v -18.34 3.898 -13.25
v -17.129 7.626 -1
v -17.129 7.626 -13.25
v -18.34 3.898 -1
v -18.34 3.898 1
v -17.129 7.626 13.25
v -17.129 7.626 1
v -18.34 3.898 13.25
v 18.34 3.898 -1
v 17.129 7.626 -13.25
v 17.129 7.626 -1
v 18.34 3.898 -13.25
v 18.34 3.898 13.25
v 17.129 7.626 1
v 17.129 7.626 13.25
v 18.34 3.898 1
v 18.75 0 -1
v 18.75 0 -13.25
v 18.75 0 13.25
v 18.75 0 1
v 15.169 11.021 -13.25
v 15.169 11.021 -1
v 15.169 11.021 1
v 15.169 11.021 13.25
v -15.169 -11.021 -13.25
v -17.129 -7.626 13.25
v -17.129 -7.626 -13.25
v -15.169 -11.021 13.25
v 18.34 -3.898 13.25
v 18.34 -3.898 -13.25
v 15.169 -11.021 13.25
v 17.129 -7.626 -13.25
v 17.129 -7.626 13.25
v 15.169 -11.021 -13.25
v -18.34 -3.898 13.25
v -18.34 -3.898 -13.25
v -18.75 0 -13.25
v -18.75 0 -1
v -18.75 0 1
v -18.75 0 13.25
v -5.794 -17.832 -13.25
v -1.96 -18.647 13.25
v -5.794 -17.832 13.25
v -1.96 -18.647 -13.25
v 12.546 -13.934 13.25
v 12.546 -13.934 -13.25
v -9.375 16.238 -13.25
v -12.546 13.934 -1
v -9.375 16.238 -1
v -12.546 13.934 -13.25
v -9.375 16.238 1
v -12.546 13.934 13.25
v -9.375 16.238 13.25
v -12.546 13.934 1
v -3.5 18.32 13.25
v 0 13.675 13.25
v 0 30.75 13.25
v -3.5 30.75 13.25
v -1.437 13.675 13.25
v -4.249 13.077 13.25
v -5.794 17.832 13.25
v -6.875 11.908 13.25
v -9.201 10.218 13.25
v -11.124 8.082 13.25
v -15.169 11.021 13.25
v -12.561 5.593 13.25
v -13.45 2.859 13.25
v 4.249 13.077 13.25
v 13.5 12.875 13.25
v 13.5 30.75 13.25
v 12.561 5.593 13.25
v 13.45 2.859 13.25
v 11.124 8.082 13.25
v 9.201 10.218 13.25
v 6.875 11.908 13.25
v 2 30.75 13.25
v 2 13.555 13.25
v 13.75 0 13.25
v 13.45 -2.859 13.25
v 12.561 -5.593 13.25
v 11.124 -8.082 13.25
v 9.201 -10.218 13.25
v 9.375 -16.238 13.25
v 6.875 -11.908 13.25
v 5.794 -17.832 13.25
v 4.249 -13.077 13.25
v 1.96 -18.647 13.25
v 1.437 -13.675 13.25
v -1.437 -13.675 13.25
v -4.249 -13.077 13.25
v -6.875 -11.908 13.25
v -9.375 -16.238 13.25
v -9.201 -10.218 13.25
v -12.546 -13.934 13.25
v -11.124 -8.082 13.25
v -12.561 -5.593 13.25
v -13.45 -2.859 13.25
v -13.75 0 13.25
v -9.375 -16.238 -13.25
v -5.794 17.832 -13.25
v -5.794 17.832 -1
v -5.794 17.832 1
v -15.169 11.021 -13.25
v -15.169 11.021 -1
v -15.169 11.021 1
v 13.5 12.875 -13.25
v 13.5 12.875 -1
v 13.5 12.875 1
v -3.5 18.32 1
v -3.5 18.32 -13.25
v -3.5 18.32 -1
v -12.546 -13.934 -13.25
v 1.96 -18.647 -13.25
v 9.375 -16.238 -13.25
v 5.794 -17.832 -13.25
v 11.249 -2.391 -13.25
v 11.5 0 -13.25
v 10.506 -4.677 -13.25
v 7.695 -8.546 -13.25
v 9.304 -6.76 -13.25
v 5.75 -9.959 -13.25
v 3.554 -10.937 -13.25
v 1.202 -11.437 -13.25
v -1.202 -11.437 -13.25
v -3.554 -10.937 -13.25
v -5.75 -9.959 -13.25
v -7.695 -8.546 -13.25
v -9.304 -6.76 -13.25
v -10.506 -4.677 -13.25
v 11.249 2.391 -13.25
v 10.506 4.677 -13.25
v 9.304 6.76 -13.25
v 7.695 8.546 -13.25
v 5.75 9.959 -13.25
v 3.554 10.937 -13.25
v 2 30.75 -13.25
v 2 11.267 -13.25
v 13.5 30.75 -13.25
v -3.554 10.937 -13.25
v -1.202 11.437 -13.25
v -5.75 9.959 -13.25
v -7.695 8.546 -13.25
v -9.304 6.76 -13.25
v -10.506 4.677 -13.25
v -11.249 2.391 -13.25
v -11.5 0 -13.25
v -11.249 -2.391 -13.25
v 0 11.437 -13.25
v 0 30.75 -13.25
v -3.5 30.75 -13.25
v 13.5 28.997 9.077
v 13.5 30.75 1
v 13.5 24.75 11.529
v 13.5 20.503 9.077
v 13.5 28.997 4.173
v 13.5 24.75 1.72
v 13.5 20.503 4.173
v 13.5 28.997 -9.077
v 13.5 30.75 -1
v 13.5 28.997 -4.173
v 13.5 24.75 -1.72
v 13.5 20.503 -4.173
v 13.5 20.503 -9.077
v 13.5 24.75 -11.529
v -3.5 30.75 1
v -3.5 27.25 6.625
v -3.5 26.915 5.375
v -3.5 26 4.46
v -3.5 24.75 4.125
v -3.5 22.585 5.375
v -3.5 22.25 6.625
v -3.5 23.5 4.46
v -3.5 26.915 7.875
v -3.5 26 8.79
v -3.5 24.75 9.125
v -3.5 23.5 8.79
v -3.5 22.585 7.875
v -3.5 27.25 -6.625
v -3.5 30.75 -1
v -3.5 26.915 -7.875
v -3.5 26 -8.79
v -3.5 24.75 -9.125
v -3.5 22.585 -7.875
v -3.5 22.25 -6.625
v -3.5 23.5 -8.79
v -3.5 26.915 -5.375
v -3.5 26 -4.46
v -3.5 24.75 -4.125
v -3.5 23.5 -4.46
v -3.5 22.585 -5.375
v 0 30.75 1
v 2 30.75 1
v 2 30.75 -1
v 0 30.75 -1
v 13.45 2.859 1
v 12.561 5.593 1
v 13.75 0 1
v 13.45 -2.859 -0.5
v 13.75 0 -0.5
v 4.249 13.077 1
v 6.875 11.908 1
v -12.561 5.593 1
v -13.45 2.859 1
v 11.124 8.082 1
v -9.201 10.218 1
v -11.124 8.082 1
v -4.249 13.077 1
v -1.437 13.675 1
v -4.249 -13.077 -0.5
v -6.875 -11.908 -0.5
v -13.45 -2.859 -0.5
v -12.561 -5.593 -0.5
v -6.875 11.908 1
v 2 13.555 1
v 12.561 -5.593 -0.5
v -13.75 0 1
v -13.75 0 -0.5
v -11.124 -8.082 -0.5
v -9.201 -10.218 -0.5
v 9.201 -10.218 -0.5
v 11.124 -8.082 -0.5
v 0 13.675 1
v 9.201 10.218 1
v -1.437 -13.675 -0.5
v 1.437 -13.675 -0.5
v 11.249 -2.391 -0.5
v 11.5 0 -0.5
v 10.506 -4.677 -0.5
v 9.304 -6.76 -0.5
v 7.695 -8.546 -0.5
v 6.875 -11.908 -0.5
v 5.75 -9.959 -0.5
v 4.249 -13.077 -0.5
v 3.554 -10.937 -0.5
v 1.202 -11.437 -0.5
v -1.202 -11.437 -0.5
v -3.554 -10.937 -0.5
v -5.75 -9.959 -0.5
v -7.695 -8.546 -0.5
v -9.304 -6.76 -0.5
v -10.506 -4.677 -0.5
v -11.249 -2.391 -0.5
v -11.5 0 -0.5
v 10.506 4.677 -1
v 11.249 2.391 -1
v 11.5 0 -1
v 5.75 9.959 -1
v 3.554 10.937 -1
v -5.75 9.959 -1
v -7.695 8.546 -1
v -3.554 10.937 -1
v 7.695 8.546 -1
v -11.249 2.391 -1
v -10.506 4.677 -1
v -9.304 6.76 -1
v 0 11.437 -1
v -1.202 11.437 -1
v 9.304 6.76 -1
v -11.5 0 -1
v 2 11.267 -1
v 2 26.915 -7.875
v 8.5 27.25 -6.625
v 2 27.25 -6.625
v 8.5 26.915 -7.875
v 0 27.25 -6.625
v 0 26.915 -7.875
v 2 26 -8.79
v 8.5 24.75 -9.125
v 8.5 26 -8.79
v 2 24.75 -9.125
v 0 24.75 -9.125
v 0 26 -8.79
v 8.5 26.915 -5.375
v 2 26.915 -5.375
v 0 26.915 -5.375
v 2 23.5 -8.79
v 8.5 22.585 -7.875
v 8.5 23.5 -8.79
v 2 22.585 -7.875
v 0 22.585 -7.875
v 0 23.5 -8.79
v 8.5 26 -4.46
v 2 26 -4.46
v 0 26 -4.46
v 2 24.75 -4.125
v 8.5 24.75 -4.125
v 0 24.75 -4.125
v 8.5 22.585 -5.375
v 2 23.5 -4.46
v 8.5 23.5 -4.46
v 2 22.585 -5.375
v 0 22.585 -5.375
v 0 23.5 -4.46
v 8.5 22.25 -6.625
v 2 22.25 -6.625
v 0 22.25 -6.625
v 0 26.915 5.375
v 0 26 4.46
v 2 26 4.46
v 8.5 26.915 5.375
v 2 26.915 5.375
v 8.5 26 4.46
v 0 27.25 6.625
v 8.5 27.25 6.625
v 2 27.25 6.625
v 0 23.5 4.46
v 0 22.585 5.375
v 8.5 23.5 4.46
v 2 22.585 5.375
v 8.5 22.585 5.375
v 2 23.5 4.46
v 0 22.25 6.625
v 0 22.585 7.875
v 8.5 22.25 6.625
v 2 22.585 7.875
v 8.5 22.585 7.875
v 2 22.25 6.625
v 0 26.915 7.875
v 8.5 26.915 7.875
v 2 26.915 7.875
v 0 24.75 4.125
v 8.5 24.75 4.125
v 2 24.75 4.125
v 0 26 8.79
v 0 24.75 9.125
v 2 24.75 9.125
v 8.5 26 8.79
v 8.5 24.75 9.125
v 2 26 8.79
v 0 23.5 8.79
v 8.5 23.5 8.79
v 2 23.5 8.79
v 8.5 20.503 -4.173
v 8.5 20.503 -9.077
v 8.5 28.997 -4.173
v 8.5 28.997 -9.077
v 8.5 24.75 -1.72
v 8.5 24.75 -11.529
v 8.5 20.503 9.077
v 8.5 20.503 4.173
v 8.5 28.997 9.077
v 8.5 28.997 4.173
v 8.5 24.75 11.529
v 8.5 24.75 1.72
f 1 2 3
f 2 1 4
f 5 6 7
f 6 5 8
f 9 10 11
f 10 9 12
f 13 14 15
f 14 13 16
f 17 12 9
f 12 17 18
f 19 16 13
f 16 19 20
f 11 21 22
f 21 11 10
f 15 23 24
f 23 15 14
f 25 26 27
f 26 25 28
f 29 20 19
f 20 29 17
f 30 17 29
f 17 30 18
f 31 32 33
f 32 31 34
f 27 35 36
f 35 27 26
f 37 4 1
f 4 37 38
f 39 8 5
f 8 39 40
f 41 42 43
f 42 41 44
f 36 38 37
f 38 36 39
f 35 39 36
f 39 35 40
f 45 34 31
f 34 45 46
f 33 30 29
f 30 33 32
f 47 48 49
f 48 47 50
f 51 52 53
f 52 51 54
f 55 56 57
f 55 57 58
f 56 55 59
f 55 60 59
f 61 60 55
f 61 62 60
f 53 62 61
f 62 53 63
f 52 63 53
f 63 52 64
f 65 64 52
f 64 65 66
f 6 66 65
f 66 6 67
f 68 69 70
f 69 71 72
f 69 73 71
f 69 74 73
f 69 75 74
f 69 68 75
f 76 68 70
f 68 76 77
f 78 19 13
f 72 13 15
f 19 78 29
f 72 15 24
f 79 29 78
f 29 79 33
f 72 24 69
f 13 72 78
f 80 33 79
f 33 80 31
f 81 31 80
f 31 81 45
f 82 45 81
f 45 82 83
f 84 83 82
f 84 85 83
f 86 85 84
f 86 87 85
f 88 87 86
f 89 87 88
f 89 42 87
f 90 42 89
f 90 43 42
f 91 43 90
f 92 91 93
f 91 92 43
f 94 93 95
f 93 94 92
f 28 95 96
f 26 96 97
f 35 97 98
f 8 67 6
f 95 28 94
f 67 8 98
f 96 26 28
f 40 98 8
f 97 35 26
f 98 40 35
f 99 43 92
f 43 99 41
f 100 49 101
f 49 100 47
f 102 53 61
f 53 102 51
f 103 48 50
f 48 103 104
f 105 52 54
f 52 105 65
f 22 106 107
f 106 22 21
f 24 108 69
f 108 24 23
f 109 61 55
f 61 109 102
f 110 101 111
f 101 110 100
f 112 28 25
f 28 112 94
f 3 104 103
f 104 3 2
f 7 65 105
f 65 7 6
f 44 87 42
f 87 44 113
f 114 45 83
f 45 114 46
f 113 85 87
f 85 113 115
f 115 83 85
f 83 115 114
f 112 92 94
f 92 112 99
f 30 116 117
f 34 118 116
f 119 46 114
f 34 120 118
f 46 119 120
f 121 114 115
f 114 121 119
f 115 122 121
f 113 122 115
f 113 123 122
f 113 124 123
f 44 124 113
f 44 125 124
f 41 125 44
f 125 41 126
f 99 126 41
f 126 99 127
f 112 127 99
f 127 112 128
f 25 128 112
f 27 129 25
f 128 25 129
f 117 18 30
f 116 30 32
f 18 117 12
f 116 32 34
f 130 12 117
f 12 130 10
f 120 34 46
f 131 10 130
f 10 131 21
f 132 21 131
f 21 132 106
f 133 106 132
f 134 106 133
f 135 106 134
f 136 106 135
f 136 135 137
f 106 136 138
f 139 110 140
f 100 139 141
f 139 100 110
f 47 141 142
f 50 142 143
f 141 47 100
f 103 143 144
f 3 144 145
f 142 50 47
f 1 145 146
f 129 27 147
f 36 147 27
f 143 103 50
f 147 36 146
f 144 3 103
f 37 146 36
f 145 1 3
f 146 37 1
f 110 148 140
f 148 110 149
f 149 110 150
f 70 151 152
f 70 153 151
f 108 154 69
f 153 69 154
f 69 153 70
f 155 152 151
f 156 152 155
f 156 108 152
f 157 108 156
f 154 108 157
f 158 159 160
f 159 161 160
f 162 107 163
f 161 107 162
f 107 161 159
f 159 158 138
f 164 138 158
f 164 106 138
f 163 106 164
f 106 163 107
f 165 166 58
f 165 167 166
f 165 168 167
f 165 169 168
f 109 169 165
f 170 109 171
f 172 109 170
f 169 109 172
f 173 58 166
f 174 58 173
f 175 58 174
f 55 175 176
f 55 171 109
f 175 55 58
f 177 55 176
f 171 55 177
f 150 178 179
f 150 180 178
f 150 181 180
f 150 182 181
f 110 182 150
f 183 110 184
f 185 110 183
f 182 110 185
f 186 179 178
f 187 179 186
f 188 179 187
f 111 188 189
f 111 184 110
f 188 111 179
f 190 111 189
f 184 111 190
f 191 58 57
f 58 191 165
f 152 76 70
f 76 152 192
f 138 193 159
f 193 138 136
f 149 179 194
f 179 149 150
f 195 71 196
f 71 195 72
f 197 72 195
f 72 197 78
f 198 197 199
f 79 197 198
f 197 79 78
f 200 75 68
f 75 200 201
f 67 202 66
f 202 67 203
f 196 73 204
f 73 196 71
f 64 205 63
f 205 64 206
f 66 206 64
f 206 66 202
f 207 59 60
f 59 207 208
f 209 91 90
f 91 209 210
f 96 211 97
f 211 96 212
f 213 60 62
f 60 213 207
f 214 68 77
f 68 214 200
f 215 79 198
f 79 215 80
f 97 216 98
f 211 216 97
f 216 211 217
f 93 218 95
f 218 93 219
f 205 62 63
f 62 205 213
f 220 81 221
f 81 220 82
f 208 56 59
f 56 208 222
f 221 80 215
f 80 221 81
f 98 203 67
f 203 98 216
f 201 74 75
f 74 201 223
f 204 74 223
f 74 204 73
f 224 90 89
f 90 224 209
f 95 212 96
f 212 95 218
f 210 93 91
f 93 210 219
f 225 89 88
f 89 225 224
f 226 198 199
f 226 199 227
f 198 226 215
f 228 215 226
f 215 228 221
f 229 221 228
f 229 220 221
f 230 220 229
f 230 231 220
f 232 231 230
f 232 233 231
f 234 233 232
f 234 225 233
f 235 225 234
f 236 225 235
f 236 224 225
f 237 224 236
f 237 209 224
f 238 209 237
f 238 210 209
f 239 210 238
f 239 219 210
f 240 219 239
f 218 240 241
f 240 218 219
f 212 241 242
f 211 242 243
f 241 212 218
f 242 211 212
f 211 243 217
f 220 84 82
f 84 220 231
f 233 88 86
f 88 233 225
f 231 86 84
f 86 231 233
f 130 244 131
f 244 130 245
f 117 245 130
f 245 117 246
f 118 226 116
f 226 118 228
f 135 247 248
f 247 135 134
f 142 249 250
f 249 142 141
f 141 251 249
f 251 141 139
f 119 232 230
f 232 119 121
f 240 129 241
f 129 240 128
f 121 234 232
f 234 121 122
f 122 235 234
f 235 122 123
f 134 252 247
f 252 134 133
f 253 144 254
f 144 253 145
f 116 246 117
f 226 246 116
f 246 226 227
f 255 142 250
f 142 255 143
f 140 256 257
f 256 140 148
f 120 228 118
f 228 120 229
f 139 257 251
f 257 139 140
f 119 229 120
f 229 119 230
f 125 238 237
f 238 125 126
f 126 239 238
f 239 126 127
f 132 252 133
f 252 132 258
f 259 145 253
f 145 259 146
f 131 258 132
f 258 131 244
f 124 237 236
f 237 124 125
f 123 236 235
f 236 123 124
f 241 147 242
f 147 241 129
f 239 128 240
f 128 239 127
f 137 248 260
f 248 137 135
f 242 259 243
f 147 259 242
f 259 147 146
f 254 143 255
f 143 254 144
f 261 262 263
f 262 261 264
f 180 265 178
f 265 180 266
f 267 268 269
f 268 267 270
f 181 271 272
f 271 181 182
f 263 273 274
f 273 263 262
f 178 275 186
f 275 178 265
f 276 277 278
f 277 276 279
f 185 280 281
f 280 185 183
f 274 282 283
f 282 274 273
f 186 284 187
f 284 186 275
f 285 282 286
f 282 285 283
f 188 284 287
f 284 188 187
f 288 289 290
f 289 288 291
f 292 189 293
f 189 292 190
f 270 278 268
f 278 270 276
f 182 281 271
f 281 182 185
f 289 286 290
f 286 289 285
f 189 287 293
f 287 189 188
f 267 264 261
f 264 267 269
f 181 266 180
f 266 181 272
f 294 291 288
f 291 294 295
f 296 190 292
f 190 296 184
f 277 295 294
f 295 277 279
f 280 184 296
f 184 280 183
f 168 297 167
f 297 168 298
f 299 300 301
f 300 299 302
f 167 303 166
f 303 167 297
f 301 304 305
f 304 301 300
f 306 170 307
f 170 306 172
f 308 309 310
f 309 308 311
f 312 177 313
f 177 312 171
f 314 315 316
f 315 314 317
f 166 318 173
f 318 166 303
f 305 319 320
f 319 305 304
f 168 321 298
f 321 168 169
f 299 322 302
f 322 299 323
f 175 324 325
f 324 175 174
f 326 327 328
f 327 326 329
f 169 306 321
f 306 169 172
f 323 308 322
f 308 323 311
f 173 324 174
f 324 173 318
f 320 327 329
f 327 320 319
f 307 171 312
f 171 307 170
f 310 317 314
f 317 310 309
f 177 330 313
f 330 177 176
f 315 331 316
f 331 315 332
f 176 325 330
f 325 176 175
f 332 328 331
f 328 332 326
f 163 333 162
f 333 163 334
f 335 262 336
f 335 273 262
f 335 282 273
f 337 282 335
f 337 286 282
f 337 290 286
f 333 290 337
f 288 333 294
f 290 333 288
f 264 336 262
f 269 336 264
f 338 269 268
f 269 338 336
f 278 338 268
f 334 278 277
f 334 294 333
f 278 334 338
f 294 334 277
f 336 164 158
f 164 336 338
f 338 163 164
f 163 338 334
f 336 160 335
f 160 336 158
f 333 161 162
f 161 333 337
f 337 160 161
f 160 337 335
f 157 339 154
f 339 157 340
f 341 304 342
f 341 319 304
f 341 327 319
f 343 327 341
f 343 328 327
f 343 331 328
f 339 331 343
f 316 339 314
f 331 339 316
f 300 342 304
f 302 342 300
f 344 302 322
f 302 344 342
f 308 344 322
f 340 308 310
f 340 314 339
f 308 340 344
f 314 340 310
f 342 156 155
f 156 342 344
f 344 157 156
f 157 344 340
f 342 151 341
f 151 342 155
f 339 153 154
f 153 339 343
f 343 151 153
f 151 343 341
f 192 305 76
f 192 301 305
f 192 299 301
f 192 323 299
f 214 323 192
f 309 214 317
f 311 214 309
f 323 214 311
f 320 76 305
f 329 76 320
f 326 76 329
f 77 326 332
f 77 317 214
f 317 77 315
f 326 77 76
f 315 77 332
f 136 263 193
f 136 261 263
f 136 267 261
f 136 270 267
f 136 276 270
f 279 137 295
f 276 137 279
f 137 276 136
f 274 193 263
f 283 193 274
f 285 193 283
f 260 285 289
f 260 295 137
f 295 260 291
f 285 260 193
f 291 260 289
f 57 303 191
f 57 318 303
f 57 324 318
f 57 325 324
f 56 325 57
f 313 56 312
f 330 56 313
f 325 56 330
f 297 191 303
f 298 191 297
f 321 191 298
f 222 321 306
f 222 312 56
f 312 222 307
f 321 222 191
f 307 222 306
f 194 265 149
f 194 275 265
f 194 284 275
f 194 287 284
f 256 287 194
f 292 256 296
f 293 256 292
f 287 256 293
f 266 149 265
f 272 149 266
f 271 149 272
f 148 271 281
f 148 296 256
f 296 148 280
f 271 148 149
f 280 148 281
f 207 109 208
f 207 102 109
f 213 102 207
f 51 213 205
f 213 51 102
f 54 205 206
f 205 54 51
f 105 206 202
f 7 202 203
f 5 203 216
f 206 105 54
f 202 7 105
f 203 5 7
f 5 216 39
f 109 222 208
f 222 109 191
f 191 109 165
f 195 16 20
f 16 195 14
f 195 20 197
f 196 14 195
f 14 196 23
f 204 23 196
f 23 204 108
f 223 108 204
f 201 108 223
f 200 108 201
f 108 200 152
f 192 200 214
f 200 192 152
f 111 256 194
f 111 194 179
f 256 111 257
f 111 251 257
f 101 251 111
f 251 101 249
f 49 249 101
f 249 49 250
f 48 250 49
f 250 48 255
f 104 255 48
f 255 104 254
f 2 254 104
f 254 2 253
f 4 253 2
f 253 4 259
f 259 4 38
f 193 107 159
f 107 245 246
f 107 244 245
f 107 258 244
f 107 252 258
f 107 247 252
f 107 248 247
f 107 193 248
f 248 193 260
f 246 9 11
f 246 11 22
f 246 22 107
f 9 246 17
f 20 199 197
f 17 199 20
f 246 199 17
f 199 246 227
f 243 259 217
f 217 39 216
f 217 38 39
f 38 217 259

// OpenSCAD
/*
Tripod leg clamp replacement
Jan 25, 2015
Corky Mork
*/
//Duiameter of larger leg (mm)
diameter1=27.5;//
//Duiameter of smaller leg (mm)
diameter2=23;//
//Diameter of screw holes (mm)
hole=5;//
//Size of nut or hex head (mm)
nut=8.5;//
/* [Hidden] */
height=26.5;
thick=5;
gap=2;
tab=12;


module tripodclamp()
{
	difference() {
		union() {			
//body
			cylinder(h = height, r = diameter1/2+thick, center = true);
//tab
		translate ([thick,diameter1/2+tab/2,0])
				 cube([thick*3+gap, tab+2*thick, height], center = true);
		}

		union() {
			translate ([0,0,height/4])
				cylinder(h = height/2+1, r = diameter1/2, center = true);
			cylinder(h = height+1, r = diameter2/2, center = true);
//screw holes
			rotate([0,90,0])
			translate([height/4,diameter1/2+tab/2+thick,gap])
				cylinder(h = thick*5, r = hole/2, center = true,$fn=12);
			rotate([0,90,0])
			translate([-height/4,diameter1/2+tab/2+thick,gap])
				cylinder(h = thick*5, r = hole/2, center = true,$fn=12);
//nut traps
			rotate([0,90,0])
			translate([height/4,diameter1/2+tab/2+thick,2*thick+gap])
				cylinder(h = thick+gap, r = nut*.577, center = true,$fn=6);
			rotate([0,90,0])
			translate([-height/4,diameter1/2+tab/2+thick,2*thick+gap])
				cylinder(h = thick+gap, r = nut*.577, center = true,$fn=6);
//slots
			translate ([gap/2,diameter1/2+1.5*thick,0])
				 cube([gap, diameter1/2+tab+thick, height+1], center = true);
			translate ([0,diameter1/4+thick/2+tab/2,0])
				 cube([diameter1+2*thick+1, diameter1/2+tab+thick, gap], center = true);
		}
	}
}

tripodclamp();
